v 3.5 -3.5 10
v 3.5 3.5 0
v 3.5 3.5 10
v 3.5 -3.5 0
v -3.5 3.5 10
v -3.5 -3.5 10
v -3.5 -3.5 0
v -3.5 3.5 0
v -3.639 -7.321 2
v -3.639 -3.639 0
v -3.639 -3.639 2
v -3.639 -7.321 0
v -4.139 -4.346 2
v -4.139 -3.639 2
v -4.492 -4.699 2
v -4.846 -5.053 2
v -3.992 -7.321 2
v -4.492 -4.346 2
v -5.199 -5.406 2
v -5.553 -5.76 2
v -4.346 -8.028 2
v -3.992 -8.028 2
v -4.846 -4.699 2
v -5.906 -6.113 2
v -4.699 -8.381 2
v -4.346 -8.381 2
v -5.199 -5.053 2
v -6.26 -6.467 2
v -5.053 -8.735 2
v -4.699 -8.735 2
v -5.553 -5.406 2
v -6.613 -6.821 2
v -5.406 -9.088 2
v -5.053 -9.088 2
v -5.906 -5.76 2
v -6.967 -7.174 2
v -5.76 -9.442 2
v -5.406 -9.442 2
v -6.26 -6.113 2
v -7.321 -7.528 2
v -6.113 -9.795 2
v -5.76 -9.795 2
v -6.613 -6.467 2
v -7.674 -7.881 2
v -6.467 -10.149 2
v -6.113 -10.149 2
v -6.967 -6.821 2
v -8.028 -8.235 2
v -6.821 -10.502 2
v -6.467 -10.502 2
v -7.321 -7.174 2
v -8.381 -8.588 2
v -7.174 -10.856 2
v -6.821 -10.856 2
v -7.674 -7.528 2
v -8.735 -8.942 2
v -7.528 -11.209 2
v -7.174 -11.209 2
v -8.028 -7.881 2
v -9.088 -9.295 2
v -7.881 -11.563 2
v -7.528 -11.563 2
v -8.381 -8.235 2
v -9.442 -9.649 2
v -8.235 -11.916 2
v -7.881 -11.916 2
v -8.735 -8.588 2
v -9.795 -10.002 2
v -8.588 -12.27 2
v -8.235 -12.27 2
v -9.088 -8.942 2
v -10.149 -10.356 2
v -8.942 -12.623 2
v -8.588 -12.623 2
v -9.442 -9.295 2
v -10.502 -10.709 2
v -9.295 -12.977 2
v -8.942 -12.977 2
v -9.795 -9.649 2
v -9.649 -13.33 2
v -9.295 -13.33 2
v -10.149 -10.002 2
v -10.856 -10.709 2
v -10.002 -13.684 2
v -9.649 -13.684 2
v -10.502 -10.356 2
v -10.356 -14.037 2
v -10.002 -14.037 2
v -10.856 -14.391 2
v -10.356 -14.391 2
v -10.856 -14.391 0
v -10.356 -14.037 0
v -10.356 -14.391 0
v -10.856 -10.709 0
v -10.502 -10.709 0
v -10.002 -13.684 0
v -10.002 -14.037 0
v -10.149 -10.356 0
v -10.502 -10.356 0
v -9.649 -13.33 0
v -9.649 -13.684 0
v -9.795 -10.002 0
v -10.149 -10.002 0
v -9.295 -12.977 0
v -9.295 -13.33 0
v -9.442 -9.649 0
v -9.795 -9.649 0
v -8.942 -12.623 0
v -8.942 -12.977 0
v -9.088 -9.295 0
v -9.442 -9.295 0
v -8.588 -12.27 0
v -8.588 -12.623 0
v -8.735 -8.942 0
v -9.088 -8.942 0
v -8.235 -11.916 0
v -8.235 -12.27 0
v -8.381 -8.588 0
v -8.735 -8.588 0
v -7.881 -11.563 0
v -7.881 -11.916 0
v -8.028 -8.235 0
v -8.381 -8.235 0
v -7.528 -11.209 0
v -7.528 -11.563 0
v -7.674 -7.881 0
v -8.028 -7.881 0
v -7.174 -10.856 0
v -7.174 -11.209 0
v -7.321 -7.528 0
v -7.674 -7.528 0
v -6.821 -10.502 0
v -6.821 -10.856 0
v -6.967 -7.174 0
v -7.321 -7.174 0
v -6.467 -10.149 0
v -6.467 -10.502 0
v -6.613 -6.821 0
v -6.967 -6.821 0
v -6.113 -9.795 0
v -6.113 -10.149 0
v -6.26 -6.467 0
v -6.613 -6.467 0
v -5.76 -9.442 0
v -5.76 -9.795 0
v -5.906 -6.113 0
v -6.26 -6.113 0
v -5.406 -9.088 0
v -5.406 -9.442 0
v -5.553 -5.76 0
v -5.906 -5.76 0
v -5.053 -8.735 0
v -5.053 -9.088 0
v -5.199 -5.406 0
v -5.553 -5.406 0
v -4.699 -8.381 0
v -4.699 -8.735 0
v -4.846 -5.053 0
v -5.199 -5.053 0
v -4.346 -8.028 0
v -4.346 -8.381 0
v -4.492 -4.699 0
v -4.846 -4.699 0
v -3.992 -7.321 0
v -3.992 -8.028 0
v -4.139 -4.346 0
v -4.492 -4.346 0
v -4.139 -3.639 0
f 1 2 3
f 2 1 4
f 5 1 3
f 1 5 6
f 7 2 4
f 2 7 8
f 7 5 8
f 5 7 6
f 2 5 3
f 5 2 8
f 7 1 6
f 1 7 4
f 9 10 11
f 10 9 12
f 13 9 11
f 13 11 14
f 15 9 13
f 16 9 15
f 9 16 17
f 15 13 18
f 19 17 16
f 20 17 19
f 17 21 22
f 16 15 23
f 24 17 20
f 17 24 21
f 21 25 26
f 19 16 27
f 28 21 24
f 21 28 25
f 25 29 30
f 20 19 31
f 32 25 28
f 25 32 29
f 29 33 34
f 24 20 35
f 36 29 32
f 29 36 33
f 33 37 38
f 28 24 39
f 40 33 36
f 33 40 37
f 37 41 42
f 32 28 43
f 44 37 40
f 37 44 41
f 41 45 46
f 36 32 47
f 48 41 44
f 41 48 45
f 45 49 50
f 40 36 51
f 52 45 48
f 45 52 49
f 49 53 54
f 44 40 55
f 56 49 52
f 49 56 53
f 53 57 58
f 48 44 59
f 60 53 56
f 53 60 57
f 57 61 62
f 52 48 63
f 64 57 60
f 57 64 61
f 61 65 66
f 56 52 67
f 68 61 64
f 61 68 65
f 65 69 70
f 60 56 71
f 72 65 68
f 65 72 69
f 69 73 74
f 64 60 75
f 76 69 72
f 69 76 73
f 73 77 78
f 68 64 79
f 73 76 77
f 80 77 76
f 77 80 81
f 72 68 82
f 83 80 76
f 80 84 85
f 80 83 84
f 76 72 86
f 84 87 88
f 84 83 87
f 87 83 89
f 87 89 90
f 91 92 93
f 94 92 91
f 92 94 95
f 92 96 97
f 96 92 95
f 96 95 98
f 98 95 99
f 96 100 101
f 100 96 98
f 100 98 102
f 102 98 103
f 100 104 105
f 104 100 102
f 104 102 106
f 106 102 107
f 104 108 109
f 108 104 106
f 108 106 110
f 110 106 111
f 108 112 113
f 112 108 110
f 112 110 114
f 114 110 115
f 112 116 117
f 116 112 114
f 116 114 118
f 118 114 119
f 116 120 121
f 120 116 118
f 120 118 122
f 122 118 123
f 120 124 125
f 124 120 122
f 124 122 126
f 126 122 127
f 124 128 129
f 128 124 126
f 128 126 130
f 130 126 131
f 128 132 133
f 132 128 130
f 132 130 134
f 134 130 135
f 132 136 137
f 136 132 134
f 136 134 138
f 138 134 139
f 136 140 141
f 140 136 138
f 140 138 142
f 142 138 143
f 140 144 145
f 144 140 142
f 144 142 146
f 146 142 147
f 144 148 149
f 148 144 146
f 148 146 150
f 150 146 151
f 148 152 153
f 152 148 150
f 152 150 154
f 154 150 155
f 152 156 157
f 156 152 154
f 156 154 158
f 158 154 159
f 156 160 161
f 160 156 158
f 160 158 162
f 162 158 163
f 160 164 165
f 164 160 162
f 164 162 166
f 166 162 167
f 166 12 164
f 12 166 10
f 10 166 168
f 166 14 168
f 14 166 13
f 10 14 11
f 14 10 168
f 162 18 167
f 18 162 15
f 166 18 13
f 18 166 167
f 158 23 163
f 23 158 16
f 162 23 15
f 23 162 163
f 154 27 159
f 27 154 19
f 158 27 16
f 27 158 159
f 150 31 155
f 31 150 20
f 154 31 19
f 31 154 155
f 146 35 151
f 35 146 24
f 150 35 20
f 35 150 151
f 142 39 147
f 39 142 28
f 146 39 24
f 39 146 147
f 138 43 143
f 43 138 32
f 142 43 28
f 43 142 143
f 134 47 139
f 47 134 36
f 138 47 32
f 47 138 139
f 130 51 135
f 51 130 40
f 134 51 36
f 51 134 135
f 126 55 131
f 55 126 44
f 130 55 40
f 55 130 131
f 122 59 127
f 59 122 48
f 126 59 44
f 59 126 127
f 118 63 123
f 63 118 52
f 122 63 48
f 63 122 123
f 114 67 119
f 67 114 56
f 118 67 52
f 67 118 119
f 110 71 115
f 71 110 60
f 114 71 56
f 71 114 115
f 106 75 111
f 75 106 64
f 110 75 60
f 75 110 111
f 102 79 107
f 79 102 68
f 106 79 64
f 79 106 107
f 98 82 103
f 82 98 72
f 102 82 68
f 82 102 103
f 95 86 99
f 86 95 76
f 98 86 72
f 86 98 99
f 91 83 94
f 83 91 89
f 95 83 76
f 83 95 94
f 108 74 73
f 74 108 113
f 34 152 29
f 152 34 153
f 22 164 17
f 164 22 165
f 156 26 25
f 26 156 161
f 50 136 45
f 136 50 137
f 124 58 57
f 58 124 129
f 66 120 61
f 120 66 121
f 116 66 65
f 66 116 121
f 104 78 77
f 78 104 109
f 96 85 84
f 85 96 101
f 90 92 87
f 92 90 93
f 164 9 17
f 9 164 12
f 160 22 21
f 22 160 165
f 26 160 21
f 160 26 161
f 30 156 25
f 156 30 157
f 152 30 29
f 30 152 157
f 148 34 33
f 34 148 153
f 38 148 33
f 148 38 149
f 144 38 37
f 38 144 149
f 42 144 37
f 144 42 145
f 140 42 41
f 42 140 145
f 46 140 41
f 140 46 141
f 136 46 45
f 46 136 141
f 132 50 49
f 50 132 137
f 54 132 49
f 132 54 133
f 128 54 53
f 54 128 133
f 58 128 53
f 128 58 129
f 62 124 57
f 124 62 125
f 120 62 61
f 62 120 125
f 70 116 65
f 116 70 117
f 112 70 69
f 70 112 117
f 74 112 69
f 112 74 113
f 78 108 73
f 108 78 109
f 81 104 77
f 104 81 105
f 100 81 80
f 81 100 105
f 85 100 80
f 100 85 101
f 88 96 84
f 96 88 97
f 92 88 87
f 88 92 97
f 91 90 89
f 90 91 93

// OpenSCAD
translate([0, 0, 5]) color([0,1,0,0.9]) cube([7, 7, 10], center=true);
translate([-3.889, -3.889, 1]) color([1,0,0]) cube([0.5, 0.5, 2], center=true);
translate([-4.242, -4.596, 1]) color([1,0,0]) cube([0.5, 0.5, 2], center=true);
translate([-4.596, -4.949, 1]) color([1,0,0]) cube([0.5, 0.5, 2], center=true);
translate([-4.949, -5.303, 1]) color([1,0,0]) cube([0.5, 0.5, 2], center=true);
translate([-5.303, -5.656, 1]) color([1,0,0]) cube([0.5, 0.5, 2], center=true);
translate([-5.656, -6.01, 1]) color([1,0,0]) cube([0.5, 0.5, 2], center=true);
translate([-6.01, -6.363, 1]) color([1,0,0]) cube([0.5, 0.5, 2], center=true);
translate([-6.363, -6.717, 1]) color([1,0,0]) cube([0.5, 0.5, 2], center=true);
translate([-6.717, -7.071, 1]) color([1,0,0]) cube([0.5, 0.5, 2], center=true);
translate([-7.071, -7.424, 1]) color([1,0,0]) cube([0.5, 0.5, 2], center=true);
translate([-7.424, -7.778, 1]) color([1,0,0]) cube([0.5, 0.5, 2], center=true);
translate([-7.778, -8.131, 1]) color([1,0,0]) cube([0.5, 0.5, 2], center=true);
translate([-8.131, -8.485, 1]) color([1,0,0]) cube([0.5, 0.5, 2], center=true);
translate([-8.485, -8.838, 1]) color([1,0,0]) cube([0.5, 0.5, 2], center=true);
translate([-8.838, -9.192, 1]) color([1,0,0]) cube([0.5, 0.5, 2], center=true);
translate([-9.192, -9.545, 1]) color([1,0,0]) cube([0.5, 0.5, 2], center=true);
translate([-9.545, -9.899, 1]) color([1,0,0]) cube([0.5, 0.5, 2], center=true);
translate([-9.899, -10.252, 1]) color([1,0,0]) cube([0.5, 0.5, 2], center=true);
translate([-10.252, -10.606, 1]) color([1,0,0]) cube([0.5, 0.5, 2], center=true);
translate([-10.606, -10.959, 1]) color([1,0,0]) cube([0.5, 0.5, 2], center=true);
translate([-3.889, -4.242, 1]) color([1,0,0]) cube([0.5, 0.5, 2], center=true);
translate([-4.242, -4.949, 1]) color([1,0,0]) cube([0.5, 0.5, 2], center=true);
translate([-4.596, -5.303, 1]) color([1,0,0]) cube([0.5, 0.5, 2], center=true);
translate([-4.949, -5.656, 1]) color([1,0,0]) cube([0.5, 0.5, 2], center=true);
translate([-5.303, -6.01, 1]) color([1,0,0]) cube([0.5, 0.5, 2], center=true);
translate([-5.656, -6.363, 1]) color([1,0,0]) cube([0.5, 0.5, 2], center=true);
translate([-6.01, -6.717, 1]) color([1,0,0]) cube([0.5, 0.5, 2], center=true);
translate([-6.363, -7.071, 1]) color([1,0,0]) cube([0.5, 0.5, 2], center=true);
translate([-6.717, -7.424, 1]) color([1,0,0]) cube([0.5, 0.5, 2], center=true);
translate([-7.071, -7.778, 1]) color([1,0,0]) cube([0.5, 0.5, 2], center=true);
translate([-7.424, -8.131, 1]) color([1,0,0]) cube([0.5, 0.5, 2], center=true);
translate([-7.778, -8.485, 1]) color([1,0,0]) cube([0.5, 0.5, 2], center=true);
translate([-8.131, -8.838, 1]) color([1,0,0]) cube([0.5, 0.5, 2], center=true);
translate([-8.485, -9.192, 1]) color([1,0,0]) cube([0.5, 0.5, 2], center=true);
translate([-8.838, -9.545, 1]) color([1,0,0]) cube([0.5, 0.5, 2], center=true);
translate([-9.192, -9.899, 1]) color([1,0,0]) cube([0.5, 0.5, 2], center=true);
translate([-9.545, -10.252, 1]) color([1,0,0]) cube([0.5, 0.5, 2], center=true);
translate([-9.899, -10.606, 1]) color([1,0,0]) cube([0.5, 0.5, 2], center=true);
translate([-10.252, -10.959, 1]) color([1,0,0]) cube([0.5, 0.5, 2], center=true);
translate([-10.606, -11.313, 1]) color([1,0,0]) cube([0.5, 0.5, 2], center=true);
translate([-3.889, -4.596, 1]) color([1,0,0]) cube([0.5, 0.5, 2], center=true);
translate([-4.242, -5.303, 1]) color([1,0,0]) cube([0.5, 0.5, 2], center=true);
translate([-4.596, -5.656, 1]) color([1,0,0]) cube([0.5, 0.5, 2], center=true);
translate([-4.949, -6.01, 1]) color([1,0,0]) cube([0.5, 0.5, 2], center=true);
translate([-5.303, -6.363, 1]) color([1,0,0]) cube([0.5, 0.5, 2], center=true);
translate([-5.656, -6.717, 1]) color([1,0,0]) cube([0.5, 0.5, 2], center=true);
translate([-6.01, -7.071, 1]) color([1,0,0]) cube([0.5, 0.5, 2], center=true);
translate([-6.363, -7.424, 1]) color([1,0,0]) cube([0.5, 0.5, 2], center=true);
translate([-6.717, -7.778, 1]) color([1,0,0]) cube([0.5, 0.5, 2], center=true);
translate([-7.071, -8.131, 1]) color([1,0,0]) cube([0.5, 0.5, 2], center=true);
translate([-7.424, -8.485, 1]) color([1,0,0]) cube([0.5, 0.5, 2], center=true);
translate([-7.778, -8.838, 1]) color([1,0,0]) cube([0.5, 0.5, 2], center=true);
translate([-8.131, -9.192, 1]) color([1,0,0]) cube([0.5, 0.5, 2], center=true);
translate([-8.485, -9.545, 1]) color([1,0,0]) cube([0.5, 0.5, 2], center=true);
translate([-8.838, -9.899, 1]) color([1,0,0]) cube([0.5, 0.5, 2], center=true);
translate([-9.192, -10.252, 1]) color([1,0,0]) cube([0.5, 0.5, 2], center=true);
translate([-9.545, -10.606, 1]) color([1,0,0]) cube([0.5, 0.5, 2], center=true);
translate([-9.899, -10.959, 1]) color([1,0,0]) cube([0.5, 0.5, 2], center=true);
translate([-10.252, -11.313, 1]) color([1,0,0]) cube([0.5, 0.5, 2], center=true);
translate([-10.606, -11.666, 1]) color([1,0,0]) cube([0.5, 0.5, 2], center=true);
translate([-3.889, -4.949, 1]) color([1,0,0]) cube([0.5, 0.5, 2], center=true);
translate([-4.242, -5.656, 1]) color([1,0,0]) cube([0.5, 0.5, 2], center=true);
translate([-4.596, -6.01, 1]) color([1,0,0]) cube([0.5, 0.5, 2], center=true);
translate([-4.949, -6.363, 1]) color([1,0,0]) cube([0.5, 0.5, 2], center=true);
translate([-5.303, -6.717, 1]) color([1,0,0]) cube([0.5, 0.5, 2], center=true);
translate([-5.656, -7.071, 1]) color([1,0,0]) cube([0.5, 0.5, 2], center=true);
translate([-6.01, -7.424, 1]) color([1,0,0]) cube([0.5, 0.5, 2], center=true);
translate([-6.363, -7.778, 1]) color([1,0,0]) cube([0.5, 0.5, 2], center=true);
translate([-6.717, -8.131, 1]) color([1,0,0]) cube([0.5, 0.5, 2], center=true);
translate([-7.071, -8.485, 1]) color([1,0,0]) cube([0.5, 0.5, 2], center=true);
translate([-7.424, -8.838, 1]) color([1,0,0]) cube([0.5, 0.5, 2], center=true);
translate([-7.778, -9.192, 1]) color([1,0,0]) cube([0.5, 0.5, 2], center=true);
translate([-8.131, -9.545, 1]) color([1,0,0]) cube([0.5, 0.5, 2], center=true);
translate([-8.485, -9.899, 1]) color([1,0,0]) cube([0.5, 0.5, 2], center=true);
translate([-8.838, -10.252, 1]) color([1,0,0]) cube([0.5, 0.5, 2], center=true);
translate([-9.192, -10.606, 1]) color([1,0,0]) cube([0.5, 0.5, 2], center=true);
translate([-9.545, -10.959, 1]) color([1,0,0]) cube([0.5, 0.5, 2], center=true);
translate([-9.899, -11.313, 1]) color([1,0,0]) cube([0.5, 0.5, 2], center=true);
translate([-10.252, -11.666, 1]) color([1,0,0]) cube([0.5, 0.5, 2], center=true);
translate([-10.606, -12.02, 1]) color([1,0,0]) cube([0.5, 0.5, 2], center=true);
translate([-3.889, -5.303, 1]) color([1,0,0]) cube([0.5, 0.5, 2], center=true);
translate([-4.242, -6.01, 1]) color([1,0,0]) cube([0.5, 0.5, 2], center=true);
translate([-4.596, -6.363, 1]) color([1,0,0]) cube([0.5, 0.5, 2], center=true);
translate([-4.949, -6.717, 1]) color([1,0,0]) cube([0.5, 0.5, 2], center=true);
translate([-5.303, -7.071, 1]) color([1,0,0]) cube([0.5, 0.5, 2], center=true);
translate([-5.656, -7.424, 1]) color([1,0,0]) cube([0.5, 0.5, 2], center=true);
translate([-6.01, -7.778, 1]) color([1,0,0]) cube([0.5, 0.5, 2], center=true);
translate([-6.363, -8.131, 1]) color([1,0,0]) cube([0.5, 0.5, 2], center=true);
translate([-6.717, -8.485, 1]) color([1,0,0]) cube([0.5, 0.5, 2], center=true);
translate([-7.071, -8.838, 1]) color([1,0,0]) cube([0.5, 0.5, 2], center=true);
translate([-7.424, -9.192, 1]) color([1,0,0]) cube([0.5, 0.5, 2], center=true);
translate([-7.778, -9.545, 1]) color([1,0,0]) cube([0.5, 0.5, 2], center=true);
translate([-8.131, -9.899, 1]) color([1,0,0]) cube([0.5, 0.5, 2], center=true);
translate([-8.485, -10.252, 1]) color([1,0,0]) cube([0.5, 0.5, 2], center=true);
translate([-8.838, -10.606, 1]) color([1,0,0]) cube([0.5, 0.5, 2], center=true);
translate([-9.192, -10.959, 1]) color([1,0,0]) cube([0.5, 0.5, 2], center=true);
translate([-9.545, -11.313, 1]) color([1,0,0]) cube([0.5, 0.5, 2], center=true);
translate([-9.899, -11.666, 1]) color([1,0,0]) cube([0.5, 0.5, 2], center=true);
translate([-10.252, -12.02, 1]) color([1,0,0]) cube([0.5, 0.5, 2], center=true);
translate([-10.606, -12.373, 1]) color([1,0,0]) cube([0.5, 0.5, 2], center=true);
translate([-3.889, -5.656, 1]) color([1,0,0]) cube([0.5, 0.5, 2], center=true);
translate([-4.242, -6.363, 1]) color([1,0,0]) cube([0.5, 0.5, 2], center=true);
translate([-4.596, -6.717, 1]) color([1,0,0]) cube([0.5, 0.5, 2], center=true);
translate([-4.949, -7.071, 1]) color([1,0,0]) cube([0.5, 0.5, 2], center=true);
translate([-5.303, -7.424, 1]) color([1,0,0]) cube([0.5, 0.5, 2], center=true);
translate([-5.656, -7.778, 1]) color([1,0,0]) cube([0.5, 0.5, 2], center=true);
translate([-6.01, -8.131, 1]) color([1,0,0]) cube([0.5, 0.5, 2], center=true);
translate([-6.363, -8.485, 1]) color([1,0,0]) cube([0.5, 0.5, 2], center=true);
translate([-6.717, -8.838, 1]) color([1,0,0]) cube([0.5, 0.5, 2], center=true);
translate([-7.071, -9.192, 1]) color([1,0,0]) cube([0.5, 0.5, 2], center=true);
translate([-7.424, -9.545, 1]) color([1,0,0]) cube([0.5, 0.5, 2], center=true);
translate([-7.778, -9.899, 1]) color([1,0,0]) cube([0.5, 0.5, 2], center=true);
translate([-8.131, -10.252, 1]) color([1,0,0]) cube([0.5, 0.5, 2], center=true);
translate([-8.485, -10.606, 1]) color([1,0,0]) cube([0.5, 0.5, 2], center=true);
translate([-8.838, -10.959, 1]) color([1,0,0]) cube([0.5, 0.5, 2], center=true);
translate([-9.192, -11.313, 1]) color([1,0,0]) cube([0.5, 0.5, 2], center=true);
translate([-9.545, -11.666, 1]) color([1,0,0]) cube([0.5, 0.5, 2], center=true);
translate([-9.899, -12.02, 1]) color([1,0,0]) cube([0.5, 0.5, 2], center=true);
translate([-10.252, -12.373, 1]) color([1,0,0]) cube([0.5, 0.5, 2], center=true);
translate([-10.606, -12.727, 1]) color([1,0,0]) cube([0.5, 0.5, 2], center=true);
translate([-3.889, -6.01, 1]) color([1,0,0]) cube([0.5, 0.5, 2], center=true);
translate([-4.242, -6.717, 1]) color([1,0,0]) cube([0.5, 0.5, 2], center=true);
translate([-4.596, -7.071, 1]) color([1,0,0]) cube([0.5, 0.5, 2], center=true);
translate([-4.949, -7.424, 1]) color([1,0,0]) cube([0.5, 0.5, 2], center=true);
translate([-5.303, -7.778, 1]) color([1,0,0]) cube([0.5, 0.5, 2], center=true);
translate([-5.656, -8.131, 1]) color([1,0,0]) cube([0.5, 0.5, 2], center=true);
translate([-6.01, -8.485, 1]) color([1,0,0]) cube([0.5, 0.5, 2], center=true);
translate([-6.363, -8.838, 1]) color([1,0,0]) cube([0.5, 0.5, 2], center=true);
translate([-6.717, -9.192, 1]) color([1,0,0]) cube([0.5, 0.5, 2], center=true);
translate([-7.071, -9.545, 1]) color([1,0,0]) cube([0.5, 0.5, 2], center=true);
translate([-7.424, -9.899, 1]) color([1,0,0]) cube([0.5, 0.5, 2], center=true);
translate([-7.778, -10.252, 1]) color([1,0,0]) cube([0.5, 0.5, 2], center=true);
translate([-8.131, -10.606, 1]) color([1,0,0]) cube([0.5, 0.5, 2], center=true);
translate([-8.485, -10.959, 1]) color([1,0,0]) cube([0.5, 0.5, 2], center=true);
translate([-8.838, -11.313, 1]) color([1,0,0]) cube([0.5, 0.5, 2], center=true);
translate([-9.192, -11.666, 1]) color([1,0,0]) cube([0.5, 0.5, 2], center=true);
translate([-9.545, -12.02, 1]) color([1,0,0]) cube([0.5, 0.5, 2], center=true);
translate([-9.899, -12.373, 1]) color([1,0,0]) cube([0.5, 0.5, 2], center=true);
translate([-10.252, -12.727, 1]) color([1,0,0]) cube([0.5, 0.5, 2], center=true);
translate([-10.606, -13.08, 1]) color([1,0,0]) cube([0.5, 0.5, 2], center=true);
translate([-3.889, -6.363, 1]) color([1,0,0]) cube([0.5, 0.5, 2], center=true);
translate([-4.242, -7.071, 1]) color([1,0,0]) cube([0.5, 0.5, 2], center=true);
translate([-4.596, -7.424, 1]) color([1,0,0]) cube([0.5, 0.5, 2], center=true);
translate([-4.949, -7.778, 1]) color([1,0,0]) cube([0.5, 0.5, 2], center=true);
translate([-5.303, -8.131, 1]) color([1,0,0]) cube([0.5, 0.5, 2], center=true);
translate([-5.656, -8.485, 1]) color([1,0,0]) cube([0.5, 0.5, 2], center=true);
translate([-6.01, -8.838, 1]) color([1,0,0]) cube([0.5, 0.5, 2], center=true);
translate([-6.363, -9.192, 1]) color([1,0,0]) cube([0.5, 0.5, 2], center=true);
translate([-6.717, -9.545, 1]) color([1,0,0]) cube([0.5, 0.5, 2], center=true);
translate([-7.071, -9.899, 1]) color([1,0,0]) cube([0.5, 0.5, 2], center=true);
translate([-7.424, -10.252, 1]) color([1,0,0]) cube([0.5, 0.5, 2], center=true);
translate([-7.778, -10.606, 1]) color([1,0,0]) cube([0.5, 0.5, 2], center=true);
translate([-8.131, -10.959, 1]) color([1,0,0]) cube([0.5, 0.5, 2], center=true);
translate([-8.485, -11.313, 1]) color([1,0,0]) cube([0.5, 0.5, 2], center=true);
translate([-8.838, -11.666, 1]) color([1,0,0]) cube([0.5, 0.5, 2], center=true);
translate([-9.192, -12.02, 1]) color([1,0,0]) cube([0.5, 0.5, 2], center=true);
translate([-9.545, -12.373, 1]) color([1,0,0]) cube([0.5, 0.5, 2], center=true);
translate([-9.899, -12.727, 1]) color([1,0,0]) cube([0.5, 0.5, 2], center=true);
translate([-10.252, -13.08, 1]) color([1,0,0]) cube([0.5, 0.5, 2], center=true);
translate([-10.606, -13.434, 1]) color([1,0,0]) cube([0.5, 0.5, 2], center=true);
translate([-3.889, -6.717, 1]) color([1,0,0]) cube([0.5, 0.5, 2], center=true);
translate([-4.242, -7.424, 1]) color([1,0,0]) cube([0.5, 0.5, 2], center=true);
translate([-4.596, -7.778, 1]) color([1,0,0]) cube([0.5, 0.5, 2], center=true);
translate([-4.949, -8.131, 1]) color([1,0,0]) cube([0.5, 0.5, 2], center=true);
translate([-5.303, -8.485, 1]) color([1,0,0]) cube([0.5, 0.5, 2], center=true);
translate([-5.656, -8.838, 1]) color([1,0,0]) cube([0.5, 0.5, 2], center=true);
translate([-6.01, -9.192, 1]) color([1,0,0]) cube([0.5, 0.5, 2], center=true);
translate([-6.363, -9.545, 1]) color([1,0,0]) cube([0.5, 0.5, 2], center=true);
translate([-6.717, -9.899, 1]) color([1,0,0]) cube([0.5, 0.5, 2], center=true);
translate([-7.071, -10.252, 1]) color([1,0,0]) cube([0.5, 0.5, 2], center=true);
translate([-7.424, -10.606, 1]) color([1,0,0]) cube([0.5, 0.5, 2], center=true);
translate([-7.778, -10.959, 1]) color([1,0,0]) cube([0.5, 0.5, 2], center=true);
translate([-8.131, -11.313, 1]) color([1,0,0]) cube([0.5, 0.5, 2], center=true);
translate([-8.485, -11.666, 1]) color([1,0,0]) cube([0.5, 0.5, 2], center=true);
translate([-8.838, -12.02, 1]) color([1,0,0]) cube([0.5, 0.5, 2], center=true);
translate([-9.192, -12.373, 1]) color([1,0,0]) cube([0.5, 0.5, 2], center=true);
translate([-9.545, -12.727, 1]) color([1,0,0]) cube([0.5, 0.5, 2], center=true);
translate([-9.899, -13.08, 1]) color([1,0,0]) cube([0.5, 0.5, 2], center=true);
translate([-10.252, -13.434, 1]) color([1,0,0]) cube([0.5, 0.5, 2], center=true);
translate([-10.606, -13.787, 1]) color([1,0,0]) cube([0.5, 0.5, 2], center=true);
translate([-3.889, -7.071, 1]) color([1,0,0]) cube([0.5, 0.5, 2], center=true);
translate([-4.242, -7.778, 1]) color([1,0,0]) cube([0.5, 0.5, 2], center=true);
translate([-4.596, -8.131, 1]) color([1,0,0]) cube([0.5, 0.5, 2], center=true);
translate([-4.949, -8.485, 1]) color([1,0,0]) cube([0.5, 0.5, 2], center=true);
translate([-5.303, -8.838, 1]) color([1,0,0]) cube([0.5, 0.5, 2], center=true);
translate([-5.656, -9.192, 1]) color([1,0,0]) cube([0.5, 0.5, 2], center=true);
translate([-6.01, -9.545, 1]) color([1,0,0]) cube([0.5, 0.5, 2], center=true);
translate([-6.363, -9.899, 1]) color([1,0,0]) cube([0.5, 0.5, 2], center=true);
translate([-6.717, -10.252, 1]) color([1,0,0]) cube([0.5, 0.5, 2], center=true);
translate([-7.071, -10.606, 1]) color([1,0,0]) cube([0.5, 0.5, 2], center=true);
translate([-7.424, -10.959, 1]) color([1,0,0]) cube([0.5, 0.5, 2], center=true);
translate([-7.778, -11.313, 1]) color([1,0,0]) cube([0.5, 0.5, 2], center=true);
translate([-8.131, -11.666, 1]) color([1,0,0]) cube([0.5, 0.5, 2], center=true);
translate([-8.485, -12.02, 1]) color([1,0,0]) cube([0.5, 0.5, 2], center=true);
translate([-8.838, -12.373, 1]) color([1,0,0]) cube([0.5, 0.5, 2], center=true);
translate([-9.192, -12.727, 1]) color([1,0,0]) cube([0.5, 0.5, 2], center=true);
translate([-9.545, -13.08, 1]) color([1,0,0]) cube([0.5, 0.5, 2], center=true);
translate([-9.899, -13.434, 1]) color([1,0,0]) cube([0.5, 0.5, 2], center=true);
translate([-10.252, -13.787, 1]) color([1,0,0]) cube([0.5, 0.5, 2], center=true);
translate([-10.606, -14.141, 1]) color([1,0,0]) cube([0.5, 0.5, 2], center=true);
